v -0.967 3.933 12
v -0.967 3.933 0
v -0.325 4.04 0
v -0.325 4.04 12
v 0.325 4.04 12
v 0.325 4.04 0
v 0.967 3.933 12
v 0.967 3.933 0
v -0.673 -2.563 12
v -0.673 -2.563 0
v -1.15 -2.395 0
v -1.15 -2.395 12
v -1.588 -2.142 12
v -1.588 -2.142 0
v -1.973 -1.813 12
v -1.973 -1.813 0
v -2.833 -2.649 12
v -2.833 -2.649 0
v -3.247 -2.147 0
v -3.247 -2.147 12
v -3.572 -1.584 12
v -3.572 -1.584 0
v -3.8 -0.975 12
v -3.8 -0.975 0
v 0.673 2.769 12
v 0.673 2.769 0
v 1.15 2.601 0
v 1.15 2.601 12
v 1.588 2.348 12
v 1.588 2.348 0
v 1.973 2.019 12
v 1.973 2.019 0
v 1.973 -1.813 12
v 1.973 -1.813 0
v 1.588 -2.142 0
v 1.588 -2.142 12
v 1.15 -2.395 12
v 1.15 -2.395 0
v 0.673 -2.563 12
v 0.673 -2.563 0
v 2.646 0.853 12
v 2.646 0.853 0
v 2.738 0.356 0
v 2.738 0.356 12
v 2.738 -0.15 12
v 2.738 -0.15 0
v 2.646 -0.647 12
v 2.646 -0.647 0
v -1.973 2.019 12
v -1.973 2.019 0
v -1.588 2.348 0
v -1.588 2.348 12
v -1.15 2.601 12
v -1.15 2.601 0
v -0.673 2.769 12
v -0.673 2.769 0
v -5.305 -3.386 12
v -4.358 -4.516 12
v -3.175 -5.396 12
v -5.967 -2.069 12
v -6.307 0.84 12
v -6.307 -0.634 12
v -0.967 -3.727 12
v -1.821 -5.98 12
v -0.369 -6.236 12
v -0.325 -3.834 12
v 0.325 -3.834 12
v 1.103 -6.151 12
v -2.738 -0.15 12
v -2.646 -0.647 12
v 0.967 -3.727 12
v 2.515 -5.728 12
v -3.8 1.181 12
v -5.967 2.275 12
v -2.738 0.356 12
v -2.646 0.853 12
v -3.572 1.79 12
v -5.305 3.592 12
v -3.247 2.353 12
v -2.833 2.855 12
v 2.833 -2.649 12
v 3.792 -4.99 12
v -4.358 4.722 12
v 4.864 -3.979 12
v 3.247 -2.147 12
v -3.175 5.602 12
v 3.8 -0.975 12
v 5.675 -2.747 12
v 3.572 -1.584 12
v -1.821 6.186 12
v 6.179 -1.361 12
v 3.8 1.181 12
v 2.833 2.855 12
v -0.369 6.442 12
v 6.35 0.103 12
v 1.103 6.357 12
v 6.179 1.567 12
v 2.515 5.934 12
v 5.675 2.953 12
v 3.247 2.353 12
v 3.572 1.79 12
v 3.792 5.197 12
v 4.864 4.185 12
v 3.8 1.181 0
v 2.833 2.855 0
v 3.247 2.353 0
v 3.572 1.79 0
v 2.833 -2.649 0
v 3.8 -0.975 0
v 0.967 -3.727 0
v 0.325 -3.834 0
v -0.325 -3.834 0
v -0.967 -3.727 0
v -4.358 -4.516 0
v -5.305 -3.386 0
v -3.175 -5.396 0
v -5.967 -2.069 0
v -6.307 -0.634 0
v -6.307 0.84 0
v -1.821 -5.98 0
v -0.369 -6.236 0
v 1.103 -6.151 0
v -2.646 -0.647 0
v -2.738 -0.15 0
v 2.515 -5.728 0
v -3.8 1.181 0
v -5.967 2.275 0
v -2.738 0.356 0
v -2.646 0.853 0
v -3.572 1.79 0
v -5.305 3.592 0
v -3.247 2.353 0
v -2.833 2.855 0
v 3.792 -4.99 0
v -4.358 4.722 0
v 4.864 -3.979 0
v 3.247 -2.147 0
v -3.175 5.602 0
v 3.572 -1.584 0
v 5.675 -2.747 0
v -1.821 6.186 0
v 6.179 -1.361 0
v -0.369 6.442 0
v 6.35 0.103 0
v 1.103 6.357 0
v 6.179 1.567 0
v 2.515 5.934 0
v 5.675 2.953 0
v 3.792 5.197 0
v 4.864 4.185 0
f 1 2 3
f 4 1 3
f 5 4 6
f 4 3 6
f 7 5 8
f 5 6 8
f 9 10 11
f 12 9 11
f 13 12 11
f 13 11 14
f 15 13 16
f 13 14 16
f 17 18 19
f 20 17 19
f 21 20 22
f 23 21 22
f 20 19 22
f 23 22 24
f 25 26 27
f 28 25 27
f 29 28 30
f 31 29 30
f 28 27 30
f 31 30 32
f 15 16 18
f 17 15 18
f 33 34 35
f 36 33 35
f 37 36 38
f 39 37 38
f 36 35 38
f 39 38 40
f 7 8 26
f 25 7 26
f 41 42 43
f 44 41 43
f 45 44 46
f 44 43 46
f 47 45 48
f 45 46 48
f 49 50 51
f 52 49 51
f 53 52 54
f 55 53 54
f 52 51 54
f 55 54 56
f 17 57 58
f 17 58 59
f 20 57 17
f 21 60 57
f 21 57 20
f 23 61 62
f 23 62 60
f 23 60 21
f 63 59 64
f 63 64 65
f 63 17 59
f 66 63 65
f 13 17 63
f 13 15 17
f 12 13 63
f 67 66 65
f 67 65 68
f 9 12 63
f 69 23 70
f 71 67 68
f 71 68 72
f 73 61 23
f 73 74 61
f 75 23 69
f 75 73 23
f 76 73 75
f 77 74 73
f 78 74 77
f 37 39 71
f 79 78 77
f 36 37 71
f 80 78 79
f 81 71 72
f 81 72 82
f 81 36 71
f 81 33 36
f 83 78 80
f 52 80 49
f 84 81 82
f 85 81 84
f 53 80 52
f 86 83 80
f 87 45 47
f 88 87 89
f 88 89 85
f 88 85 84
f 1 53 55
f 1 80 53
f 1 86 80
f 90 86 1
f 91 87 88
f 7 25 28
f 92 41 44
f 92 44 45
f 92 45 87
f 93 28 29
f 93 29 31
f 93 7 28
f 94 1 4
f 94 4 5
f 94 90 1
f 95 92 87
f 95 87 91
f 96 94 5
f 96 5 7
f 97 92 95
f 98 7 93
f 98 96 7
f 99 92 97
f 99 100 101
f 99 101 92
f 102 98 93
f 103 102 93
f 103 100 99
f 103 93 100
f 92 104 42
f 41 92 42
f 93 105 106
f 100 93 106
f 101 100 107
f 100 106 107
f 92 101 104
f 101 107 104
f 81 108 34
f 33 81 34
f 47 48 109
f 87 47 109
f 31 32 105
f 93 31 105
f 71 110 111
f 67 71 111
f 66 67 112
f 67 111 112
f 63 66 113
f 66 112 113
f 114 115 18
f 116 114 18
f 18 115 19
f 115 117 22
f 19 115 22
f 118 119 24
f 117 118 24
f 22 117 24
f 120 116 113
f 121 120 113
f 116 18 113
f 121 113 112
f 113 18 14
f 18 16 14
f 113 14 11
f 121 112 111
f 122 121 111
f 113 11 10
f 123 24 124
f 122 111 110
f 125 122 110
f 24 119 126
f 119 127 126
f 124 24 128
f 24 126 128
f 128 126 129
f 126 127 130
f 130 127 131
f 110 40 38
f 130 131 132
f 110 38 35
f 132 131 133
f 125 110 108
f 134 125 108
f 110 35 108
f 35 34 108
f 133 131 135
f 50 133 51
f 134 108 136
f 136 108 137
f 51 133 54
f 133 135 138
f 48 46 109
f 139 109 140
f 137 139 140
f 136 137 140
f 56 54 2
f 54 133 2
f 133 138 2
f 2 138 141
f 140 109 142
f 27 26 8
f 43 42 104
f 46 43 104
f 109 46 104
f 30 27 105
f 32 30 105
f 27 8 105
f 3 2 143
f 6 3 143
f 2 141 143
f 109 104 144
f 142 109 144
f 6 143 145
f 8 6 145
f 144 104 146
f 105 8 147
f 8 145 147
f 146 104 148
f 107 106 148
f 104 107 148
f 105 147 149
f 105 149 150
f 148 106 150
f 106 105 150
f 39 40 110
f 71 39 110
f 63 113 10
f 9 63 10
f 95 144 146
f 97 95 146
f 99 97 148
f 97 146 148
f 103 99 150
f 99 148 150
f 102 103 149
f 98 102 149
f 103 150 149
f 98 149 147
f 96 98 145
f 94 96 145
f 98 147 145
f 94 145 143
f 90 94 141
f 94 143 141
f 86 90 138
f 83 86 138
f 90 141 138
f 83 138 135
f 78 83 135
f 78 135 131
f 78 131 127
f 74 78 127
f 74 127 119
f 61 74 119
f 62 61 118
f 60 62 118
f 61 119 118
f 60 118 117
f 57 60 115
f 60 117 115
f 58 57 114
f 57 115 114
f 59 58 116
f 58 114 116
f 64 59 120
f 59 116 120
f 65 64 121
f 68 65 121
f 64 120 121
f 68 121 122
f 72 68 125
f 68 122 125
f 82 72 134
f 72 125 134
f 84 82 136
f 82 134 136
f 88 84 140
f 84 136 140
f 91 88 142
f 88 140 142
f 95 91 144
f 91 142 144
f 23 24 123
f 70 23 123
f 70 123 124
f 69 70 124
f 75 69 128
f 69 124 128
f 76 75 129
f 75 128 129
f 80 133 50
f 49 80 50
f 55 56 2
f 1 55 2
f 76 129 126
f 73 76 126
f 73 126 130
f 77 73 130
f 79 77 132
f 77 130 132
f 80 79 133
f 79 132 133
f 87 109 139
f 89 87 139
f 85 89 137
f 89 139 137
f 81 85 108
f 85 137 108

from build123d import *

# Parameters (mm, degrees)
F0_R     = 6.35
F1_DEPTH = 12


with BuildPart() as f1:
    # F0 (on Top) → F1 (new body)
    with BuildSketch(Plane.XY):
        with Locations((0, 0.103021)):
            Circle(F0_R)
        with BuildLine():
            ThreePointArc((-2.645654, -0.64732), (-2.75, 0.103021), (-2.645654, 0.853363))
            Line((-2.645654, 0.853363), (-3.800122, 1.180785))
            ThreePointArc((-3.800122, 1.180785), (-3.4208, 2.078021), (-2.833431, 2.855142))
            Line((-2.833431, 2.855142), (-1.972642, 2.019054))
            ThreePointArc((-1.972642, 2.019054), (-1.375, 2.484591), (-0.673012, 2.769396))
            Line((-0.673012, 2.769396), (-0.96669, 3.932905))
            ThreePointArc((-0.96669, 3.932905), (0, 4.053021), (0.96669, 3.932905))
            Line((0.96669, 3.932905), (0.673012, 2.769396))
            ThreePointArc((0.673012, 2.769396), (1.375, 2.484591), (1.972642, 2.019054))
            Line((1.972642, 2.019054), (2.833431, 2.855142))
            ThreePointArc((2.833431, 2.855142), (3.4208, 2.078021), (3.800122, 1.180785))
            Line((3.800122, 1.180785), (2.645654, 0.853363))
            ThreePointArc((2.645654, 0.853363), (2.75, 0.103021), (2.645654, -0.64732))
            Line((2.645654, -0.64732), (3.800122, -0.974742))
            ThreePointArc((3.800122, -0.974742), (3.4208, -1.871979), (2.833431, -2.649099))
            Line((2.833431, -2.649099), (1.972642, -1.813012))
            ThreePointArc((1.972642, -1.813012), (1.375, -2.278549), (0.673012, -2.563353))
            Line((0.673012, -2.563353), (0.96669, -3.726862))
            ThreePointArc((0.96669, -3.726862), (0, -3.846979), (-0.96669, -3.726862))
            Line((-0.96669, -3.726862), (-0.673012, -2.563353))
            ThreePointArc((-0.673012, -2.563353), (-1.375, -2.278549), (-1.972642, -1.813012))
            Line((-1.972642, -1.813012), (-2.833431, -2.649099))
            ThreePointArc((-2.833431, -2.649099), (-3.4208, -1.871979), (-3.800122, -0.974742))
            Line((-3.800122, -0.974742), (-2.645654, -0.64732))
        make_face(mode=Mode.SUBTRACT)
    extrude(amount=F1_DEPTH)


solid = f1.part
